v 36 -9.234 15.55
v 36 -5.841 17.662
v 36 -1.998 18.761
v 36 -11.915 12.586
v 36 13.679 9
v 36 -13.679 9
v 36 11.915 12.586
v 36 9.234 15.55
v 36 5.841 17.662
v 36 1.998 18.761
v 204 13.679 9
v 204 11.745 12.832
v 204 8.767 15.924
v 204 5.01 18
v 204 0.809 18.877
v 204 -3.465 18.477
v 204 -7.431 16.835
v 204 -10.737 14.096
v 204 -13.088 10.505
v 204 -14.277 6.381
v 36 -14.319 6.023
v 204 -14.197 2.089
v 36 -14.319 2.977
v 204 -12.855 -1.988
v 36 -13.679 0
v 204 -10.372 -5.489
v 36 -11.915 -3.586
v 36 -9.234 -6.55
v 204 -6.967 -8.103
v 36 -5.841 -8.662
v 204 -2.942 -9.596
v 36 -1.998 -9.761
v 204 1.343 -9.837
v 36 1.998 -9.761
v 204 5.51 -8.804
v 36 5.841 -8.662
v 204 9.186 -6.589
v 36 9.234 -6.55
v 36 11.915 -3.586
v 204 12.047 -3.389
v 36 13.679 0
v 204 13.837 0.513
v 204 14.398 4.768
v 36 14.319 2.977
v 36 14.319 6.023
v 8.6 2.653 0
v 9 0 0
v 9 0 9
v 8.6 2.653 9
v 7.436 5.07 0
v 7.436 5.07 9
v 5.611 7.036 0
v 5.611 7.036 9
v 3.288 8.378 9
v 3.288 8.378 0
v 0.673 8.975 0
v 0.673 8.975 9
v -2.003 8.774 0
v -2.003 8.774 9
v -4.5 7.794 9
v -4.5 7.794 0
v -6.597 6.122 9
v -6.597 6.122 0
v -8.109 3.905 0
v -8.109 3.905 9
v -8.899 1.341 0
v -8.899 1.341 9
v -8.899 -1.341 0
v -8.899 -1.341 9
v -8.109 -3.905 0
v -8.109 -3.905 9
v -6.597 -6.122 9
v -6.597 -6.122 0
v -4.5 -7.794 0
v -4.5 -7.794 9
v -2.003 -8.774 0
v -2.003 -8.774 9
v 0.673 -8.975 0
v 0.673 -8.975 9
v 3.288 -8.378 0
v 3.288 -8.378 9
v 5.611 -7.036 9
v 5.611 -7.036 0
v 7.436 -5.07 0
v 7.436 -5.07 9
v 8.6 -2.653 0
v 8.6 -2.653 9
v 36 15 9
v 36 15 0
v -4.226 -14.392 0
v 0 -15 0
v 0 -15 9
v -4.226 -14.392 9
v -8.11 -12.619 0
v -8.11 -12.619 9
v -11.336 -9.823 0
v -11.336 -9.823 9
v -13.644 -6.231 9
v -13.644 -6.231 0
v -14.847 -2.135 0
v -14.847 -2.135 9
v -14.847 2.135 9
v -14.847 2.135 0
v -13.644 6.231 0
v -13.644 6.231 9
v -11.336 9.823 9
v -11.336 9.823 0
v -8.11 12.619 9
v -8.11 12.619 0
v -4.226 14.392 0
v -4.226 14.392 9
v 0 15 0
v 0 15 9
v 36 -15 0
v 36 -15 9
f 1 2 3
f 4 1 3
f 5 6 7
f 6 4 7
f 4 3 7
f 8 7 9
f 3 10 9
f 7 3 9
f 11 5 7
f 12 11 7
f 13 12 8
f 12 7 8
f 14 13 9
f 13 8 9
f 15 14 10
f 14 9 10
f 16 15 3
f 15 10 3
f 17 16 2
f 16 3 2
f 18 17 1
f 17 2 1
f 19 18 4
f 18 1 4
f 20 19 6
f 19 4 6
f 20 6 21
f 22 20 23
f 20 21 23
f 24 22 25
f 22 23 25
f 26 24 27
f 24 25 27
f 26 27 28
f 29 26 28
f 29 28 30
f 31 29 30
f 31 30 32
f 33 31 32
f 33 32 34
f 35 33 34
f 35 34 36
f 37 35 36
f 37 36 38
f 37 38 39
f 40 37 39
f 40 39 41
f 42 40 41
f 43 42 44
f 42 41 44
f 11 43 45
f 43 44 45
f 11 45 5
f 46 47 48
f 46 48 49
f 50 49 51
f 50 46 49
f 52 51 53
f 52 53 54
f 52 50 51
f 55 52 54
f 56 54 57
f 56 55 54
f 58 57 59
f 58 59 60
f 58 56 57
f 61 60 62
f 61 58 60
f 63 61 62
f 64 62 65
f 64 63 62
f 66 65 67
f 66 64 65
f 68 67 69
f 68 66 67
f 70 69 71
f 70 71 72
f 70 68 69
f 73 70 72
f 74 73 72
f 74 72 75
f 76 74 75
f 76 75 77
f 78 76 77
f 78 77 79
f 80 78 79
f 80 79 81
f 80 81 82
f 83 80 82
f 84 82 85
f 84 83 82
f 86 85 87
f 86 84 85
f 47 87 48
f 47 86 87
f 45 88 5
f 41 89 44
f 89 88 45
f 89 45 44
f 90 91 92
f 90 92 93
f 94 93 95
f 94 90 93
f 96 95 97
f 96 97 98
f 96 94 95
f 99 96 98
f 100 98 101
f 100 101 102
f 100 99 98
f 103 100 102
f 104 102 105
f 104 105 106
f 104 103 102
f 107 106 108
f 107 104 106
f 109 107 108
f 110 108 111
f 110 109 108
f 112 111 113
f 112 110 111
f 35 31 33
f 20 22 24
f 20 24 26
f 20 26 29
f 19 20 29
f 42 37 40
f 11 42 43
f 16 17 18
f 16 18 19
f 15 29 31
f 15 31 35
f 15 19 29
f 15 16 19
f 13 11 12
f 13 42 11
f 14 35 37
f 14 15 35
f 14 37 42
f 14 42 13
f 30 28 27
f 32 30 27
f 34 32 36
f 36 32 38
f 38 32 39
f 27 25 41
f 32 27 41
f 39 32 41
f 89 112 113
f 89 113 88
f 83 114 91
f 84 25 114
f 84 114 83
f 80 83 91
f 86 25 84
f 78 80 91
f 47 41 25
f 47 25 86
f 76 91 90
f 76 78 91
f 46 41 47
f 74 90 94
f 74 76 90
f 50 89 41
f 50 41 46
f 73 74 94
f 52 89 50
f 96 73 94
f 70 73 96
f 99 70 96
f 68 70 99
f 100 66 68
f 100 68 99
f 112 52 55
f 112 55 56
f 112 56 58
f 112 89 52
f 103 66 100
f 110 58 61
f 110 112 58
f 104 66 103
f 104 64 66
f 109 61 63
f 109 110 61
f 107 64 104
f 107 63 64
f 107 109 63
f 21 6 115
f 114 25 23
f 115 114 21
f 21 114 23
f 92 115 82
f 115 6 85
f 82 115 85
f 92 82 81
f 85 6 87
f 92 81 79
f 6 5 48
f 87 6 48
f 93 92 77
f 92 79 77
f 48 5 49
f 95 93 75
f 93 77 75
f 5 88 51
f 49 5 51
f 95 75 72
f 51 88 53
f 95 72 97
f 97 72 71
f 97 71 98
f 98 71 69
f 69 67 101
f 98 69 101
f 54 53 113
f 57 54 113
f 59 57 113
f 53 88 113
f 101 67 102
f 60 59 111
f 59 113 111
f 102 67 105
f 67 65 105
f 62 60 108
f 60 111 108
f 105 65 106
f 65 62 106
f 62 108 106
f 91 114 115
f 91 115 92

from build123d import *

# Parameters (mm, degrees)
SKETCH_1_R      = 15
EXTRUDE_1_DEPTH = 15
SKETCH_2_R      = 24
EXTRUDE_2_DEPTH = 280
SCALE_1_SCALE   = 0.6


with BuildPart() as part:
    # 草图1 → 凸台-拉伸1 (new body)
    with BuildSketch(Plane.XY):
        with BuildLine():
            Line((0, 25), (60, 25))
            Line((60, 25), (60, -25))
            Line((60, -25), (0, -25))
            ThreePointArc((0, -25), (-25, 0), (0, 25))
        make_face()
        Circle(SKETCH_1_R, mode=Mode.SUBTRACT)
    extrude(amount=EXTRUDE_1_DEPTH)

    # 草图2 → 凸台-拉伸2 (add)
    with BuildSketch(Plane(origin=(60, 0, 0), x_dir=(0, 0, -1), z_dir=(1, 0, 0))):
        with Locations(Location((-7.5, 0, 0), (0, 0, 108.209956864))):
            Circle(SKETCH_2_R)
    extrude(amount=EXTRUDE_2_DEPTH)


with BuildPart() as part_1:
    # 缩放比例1: scaled about (0, 0, 0)
    add(part.part.scale(SCALE_1_SCALE))


solid = part_1.part
